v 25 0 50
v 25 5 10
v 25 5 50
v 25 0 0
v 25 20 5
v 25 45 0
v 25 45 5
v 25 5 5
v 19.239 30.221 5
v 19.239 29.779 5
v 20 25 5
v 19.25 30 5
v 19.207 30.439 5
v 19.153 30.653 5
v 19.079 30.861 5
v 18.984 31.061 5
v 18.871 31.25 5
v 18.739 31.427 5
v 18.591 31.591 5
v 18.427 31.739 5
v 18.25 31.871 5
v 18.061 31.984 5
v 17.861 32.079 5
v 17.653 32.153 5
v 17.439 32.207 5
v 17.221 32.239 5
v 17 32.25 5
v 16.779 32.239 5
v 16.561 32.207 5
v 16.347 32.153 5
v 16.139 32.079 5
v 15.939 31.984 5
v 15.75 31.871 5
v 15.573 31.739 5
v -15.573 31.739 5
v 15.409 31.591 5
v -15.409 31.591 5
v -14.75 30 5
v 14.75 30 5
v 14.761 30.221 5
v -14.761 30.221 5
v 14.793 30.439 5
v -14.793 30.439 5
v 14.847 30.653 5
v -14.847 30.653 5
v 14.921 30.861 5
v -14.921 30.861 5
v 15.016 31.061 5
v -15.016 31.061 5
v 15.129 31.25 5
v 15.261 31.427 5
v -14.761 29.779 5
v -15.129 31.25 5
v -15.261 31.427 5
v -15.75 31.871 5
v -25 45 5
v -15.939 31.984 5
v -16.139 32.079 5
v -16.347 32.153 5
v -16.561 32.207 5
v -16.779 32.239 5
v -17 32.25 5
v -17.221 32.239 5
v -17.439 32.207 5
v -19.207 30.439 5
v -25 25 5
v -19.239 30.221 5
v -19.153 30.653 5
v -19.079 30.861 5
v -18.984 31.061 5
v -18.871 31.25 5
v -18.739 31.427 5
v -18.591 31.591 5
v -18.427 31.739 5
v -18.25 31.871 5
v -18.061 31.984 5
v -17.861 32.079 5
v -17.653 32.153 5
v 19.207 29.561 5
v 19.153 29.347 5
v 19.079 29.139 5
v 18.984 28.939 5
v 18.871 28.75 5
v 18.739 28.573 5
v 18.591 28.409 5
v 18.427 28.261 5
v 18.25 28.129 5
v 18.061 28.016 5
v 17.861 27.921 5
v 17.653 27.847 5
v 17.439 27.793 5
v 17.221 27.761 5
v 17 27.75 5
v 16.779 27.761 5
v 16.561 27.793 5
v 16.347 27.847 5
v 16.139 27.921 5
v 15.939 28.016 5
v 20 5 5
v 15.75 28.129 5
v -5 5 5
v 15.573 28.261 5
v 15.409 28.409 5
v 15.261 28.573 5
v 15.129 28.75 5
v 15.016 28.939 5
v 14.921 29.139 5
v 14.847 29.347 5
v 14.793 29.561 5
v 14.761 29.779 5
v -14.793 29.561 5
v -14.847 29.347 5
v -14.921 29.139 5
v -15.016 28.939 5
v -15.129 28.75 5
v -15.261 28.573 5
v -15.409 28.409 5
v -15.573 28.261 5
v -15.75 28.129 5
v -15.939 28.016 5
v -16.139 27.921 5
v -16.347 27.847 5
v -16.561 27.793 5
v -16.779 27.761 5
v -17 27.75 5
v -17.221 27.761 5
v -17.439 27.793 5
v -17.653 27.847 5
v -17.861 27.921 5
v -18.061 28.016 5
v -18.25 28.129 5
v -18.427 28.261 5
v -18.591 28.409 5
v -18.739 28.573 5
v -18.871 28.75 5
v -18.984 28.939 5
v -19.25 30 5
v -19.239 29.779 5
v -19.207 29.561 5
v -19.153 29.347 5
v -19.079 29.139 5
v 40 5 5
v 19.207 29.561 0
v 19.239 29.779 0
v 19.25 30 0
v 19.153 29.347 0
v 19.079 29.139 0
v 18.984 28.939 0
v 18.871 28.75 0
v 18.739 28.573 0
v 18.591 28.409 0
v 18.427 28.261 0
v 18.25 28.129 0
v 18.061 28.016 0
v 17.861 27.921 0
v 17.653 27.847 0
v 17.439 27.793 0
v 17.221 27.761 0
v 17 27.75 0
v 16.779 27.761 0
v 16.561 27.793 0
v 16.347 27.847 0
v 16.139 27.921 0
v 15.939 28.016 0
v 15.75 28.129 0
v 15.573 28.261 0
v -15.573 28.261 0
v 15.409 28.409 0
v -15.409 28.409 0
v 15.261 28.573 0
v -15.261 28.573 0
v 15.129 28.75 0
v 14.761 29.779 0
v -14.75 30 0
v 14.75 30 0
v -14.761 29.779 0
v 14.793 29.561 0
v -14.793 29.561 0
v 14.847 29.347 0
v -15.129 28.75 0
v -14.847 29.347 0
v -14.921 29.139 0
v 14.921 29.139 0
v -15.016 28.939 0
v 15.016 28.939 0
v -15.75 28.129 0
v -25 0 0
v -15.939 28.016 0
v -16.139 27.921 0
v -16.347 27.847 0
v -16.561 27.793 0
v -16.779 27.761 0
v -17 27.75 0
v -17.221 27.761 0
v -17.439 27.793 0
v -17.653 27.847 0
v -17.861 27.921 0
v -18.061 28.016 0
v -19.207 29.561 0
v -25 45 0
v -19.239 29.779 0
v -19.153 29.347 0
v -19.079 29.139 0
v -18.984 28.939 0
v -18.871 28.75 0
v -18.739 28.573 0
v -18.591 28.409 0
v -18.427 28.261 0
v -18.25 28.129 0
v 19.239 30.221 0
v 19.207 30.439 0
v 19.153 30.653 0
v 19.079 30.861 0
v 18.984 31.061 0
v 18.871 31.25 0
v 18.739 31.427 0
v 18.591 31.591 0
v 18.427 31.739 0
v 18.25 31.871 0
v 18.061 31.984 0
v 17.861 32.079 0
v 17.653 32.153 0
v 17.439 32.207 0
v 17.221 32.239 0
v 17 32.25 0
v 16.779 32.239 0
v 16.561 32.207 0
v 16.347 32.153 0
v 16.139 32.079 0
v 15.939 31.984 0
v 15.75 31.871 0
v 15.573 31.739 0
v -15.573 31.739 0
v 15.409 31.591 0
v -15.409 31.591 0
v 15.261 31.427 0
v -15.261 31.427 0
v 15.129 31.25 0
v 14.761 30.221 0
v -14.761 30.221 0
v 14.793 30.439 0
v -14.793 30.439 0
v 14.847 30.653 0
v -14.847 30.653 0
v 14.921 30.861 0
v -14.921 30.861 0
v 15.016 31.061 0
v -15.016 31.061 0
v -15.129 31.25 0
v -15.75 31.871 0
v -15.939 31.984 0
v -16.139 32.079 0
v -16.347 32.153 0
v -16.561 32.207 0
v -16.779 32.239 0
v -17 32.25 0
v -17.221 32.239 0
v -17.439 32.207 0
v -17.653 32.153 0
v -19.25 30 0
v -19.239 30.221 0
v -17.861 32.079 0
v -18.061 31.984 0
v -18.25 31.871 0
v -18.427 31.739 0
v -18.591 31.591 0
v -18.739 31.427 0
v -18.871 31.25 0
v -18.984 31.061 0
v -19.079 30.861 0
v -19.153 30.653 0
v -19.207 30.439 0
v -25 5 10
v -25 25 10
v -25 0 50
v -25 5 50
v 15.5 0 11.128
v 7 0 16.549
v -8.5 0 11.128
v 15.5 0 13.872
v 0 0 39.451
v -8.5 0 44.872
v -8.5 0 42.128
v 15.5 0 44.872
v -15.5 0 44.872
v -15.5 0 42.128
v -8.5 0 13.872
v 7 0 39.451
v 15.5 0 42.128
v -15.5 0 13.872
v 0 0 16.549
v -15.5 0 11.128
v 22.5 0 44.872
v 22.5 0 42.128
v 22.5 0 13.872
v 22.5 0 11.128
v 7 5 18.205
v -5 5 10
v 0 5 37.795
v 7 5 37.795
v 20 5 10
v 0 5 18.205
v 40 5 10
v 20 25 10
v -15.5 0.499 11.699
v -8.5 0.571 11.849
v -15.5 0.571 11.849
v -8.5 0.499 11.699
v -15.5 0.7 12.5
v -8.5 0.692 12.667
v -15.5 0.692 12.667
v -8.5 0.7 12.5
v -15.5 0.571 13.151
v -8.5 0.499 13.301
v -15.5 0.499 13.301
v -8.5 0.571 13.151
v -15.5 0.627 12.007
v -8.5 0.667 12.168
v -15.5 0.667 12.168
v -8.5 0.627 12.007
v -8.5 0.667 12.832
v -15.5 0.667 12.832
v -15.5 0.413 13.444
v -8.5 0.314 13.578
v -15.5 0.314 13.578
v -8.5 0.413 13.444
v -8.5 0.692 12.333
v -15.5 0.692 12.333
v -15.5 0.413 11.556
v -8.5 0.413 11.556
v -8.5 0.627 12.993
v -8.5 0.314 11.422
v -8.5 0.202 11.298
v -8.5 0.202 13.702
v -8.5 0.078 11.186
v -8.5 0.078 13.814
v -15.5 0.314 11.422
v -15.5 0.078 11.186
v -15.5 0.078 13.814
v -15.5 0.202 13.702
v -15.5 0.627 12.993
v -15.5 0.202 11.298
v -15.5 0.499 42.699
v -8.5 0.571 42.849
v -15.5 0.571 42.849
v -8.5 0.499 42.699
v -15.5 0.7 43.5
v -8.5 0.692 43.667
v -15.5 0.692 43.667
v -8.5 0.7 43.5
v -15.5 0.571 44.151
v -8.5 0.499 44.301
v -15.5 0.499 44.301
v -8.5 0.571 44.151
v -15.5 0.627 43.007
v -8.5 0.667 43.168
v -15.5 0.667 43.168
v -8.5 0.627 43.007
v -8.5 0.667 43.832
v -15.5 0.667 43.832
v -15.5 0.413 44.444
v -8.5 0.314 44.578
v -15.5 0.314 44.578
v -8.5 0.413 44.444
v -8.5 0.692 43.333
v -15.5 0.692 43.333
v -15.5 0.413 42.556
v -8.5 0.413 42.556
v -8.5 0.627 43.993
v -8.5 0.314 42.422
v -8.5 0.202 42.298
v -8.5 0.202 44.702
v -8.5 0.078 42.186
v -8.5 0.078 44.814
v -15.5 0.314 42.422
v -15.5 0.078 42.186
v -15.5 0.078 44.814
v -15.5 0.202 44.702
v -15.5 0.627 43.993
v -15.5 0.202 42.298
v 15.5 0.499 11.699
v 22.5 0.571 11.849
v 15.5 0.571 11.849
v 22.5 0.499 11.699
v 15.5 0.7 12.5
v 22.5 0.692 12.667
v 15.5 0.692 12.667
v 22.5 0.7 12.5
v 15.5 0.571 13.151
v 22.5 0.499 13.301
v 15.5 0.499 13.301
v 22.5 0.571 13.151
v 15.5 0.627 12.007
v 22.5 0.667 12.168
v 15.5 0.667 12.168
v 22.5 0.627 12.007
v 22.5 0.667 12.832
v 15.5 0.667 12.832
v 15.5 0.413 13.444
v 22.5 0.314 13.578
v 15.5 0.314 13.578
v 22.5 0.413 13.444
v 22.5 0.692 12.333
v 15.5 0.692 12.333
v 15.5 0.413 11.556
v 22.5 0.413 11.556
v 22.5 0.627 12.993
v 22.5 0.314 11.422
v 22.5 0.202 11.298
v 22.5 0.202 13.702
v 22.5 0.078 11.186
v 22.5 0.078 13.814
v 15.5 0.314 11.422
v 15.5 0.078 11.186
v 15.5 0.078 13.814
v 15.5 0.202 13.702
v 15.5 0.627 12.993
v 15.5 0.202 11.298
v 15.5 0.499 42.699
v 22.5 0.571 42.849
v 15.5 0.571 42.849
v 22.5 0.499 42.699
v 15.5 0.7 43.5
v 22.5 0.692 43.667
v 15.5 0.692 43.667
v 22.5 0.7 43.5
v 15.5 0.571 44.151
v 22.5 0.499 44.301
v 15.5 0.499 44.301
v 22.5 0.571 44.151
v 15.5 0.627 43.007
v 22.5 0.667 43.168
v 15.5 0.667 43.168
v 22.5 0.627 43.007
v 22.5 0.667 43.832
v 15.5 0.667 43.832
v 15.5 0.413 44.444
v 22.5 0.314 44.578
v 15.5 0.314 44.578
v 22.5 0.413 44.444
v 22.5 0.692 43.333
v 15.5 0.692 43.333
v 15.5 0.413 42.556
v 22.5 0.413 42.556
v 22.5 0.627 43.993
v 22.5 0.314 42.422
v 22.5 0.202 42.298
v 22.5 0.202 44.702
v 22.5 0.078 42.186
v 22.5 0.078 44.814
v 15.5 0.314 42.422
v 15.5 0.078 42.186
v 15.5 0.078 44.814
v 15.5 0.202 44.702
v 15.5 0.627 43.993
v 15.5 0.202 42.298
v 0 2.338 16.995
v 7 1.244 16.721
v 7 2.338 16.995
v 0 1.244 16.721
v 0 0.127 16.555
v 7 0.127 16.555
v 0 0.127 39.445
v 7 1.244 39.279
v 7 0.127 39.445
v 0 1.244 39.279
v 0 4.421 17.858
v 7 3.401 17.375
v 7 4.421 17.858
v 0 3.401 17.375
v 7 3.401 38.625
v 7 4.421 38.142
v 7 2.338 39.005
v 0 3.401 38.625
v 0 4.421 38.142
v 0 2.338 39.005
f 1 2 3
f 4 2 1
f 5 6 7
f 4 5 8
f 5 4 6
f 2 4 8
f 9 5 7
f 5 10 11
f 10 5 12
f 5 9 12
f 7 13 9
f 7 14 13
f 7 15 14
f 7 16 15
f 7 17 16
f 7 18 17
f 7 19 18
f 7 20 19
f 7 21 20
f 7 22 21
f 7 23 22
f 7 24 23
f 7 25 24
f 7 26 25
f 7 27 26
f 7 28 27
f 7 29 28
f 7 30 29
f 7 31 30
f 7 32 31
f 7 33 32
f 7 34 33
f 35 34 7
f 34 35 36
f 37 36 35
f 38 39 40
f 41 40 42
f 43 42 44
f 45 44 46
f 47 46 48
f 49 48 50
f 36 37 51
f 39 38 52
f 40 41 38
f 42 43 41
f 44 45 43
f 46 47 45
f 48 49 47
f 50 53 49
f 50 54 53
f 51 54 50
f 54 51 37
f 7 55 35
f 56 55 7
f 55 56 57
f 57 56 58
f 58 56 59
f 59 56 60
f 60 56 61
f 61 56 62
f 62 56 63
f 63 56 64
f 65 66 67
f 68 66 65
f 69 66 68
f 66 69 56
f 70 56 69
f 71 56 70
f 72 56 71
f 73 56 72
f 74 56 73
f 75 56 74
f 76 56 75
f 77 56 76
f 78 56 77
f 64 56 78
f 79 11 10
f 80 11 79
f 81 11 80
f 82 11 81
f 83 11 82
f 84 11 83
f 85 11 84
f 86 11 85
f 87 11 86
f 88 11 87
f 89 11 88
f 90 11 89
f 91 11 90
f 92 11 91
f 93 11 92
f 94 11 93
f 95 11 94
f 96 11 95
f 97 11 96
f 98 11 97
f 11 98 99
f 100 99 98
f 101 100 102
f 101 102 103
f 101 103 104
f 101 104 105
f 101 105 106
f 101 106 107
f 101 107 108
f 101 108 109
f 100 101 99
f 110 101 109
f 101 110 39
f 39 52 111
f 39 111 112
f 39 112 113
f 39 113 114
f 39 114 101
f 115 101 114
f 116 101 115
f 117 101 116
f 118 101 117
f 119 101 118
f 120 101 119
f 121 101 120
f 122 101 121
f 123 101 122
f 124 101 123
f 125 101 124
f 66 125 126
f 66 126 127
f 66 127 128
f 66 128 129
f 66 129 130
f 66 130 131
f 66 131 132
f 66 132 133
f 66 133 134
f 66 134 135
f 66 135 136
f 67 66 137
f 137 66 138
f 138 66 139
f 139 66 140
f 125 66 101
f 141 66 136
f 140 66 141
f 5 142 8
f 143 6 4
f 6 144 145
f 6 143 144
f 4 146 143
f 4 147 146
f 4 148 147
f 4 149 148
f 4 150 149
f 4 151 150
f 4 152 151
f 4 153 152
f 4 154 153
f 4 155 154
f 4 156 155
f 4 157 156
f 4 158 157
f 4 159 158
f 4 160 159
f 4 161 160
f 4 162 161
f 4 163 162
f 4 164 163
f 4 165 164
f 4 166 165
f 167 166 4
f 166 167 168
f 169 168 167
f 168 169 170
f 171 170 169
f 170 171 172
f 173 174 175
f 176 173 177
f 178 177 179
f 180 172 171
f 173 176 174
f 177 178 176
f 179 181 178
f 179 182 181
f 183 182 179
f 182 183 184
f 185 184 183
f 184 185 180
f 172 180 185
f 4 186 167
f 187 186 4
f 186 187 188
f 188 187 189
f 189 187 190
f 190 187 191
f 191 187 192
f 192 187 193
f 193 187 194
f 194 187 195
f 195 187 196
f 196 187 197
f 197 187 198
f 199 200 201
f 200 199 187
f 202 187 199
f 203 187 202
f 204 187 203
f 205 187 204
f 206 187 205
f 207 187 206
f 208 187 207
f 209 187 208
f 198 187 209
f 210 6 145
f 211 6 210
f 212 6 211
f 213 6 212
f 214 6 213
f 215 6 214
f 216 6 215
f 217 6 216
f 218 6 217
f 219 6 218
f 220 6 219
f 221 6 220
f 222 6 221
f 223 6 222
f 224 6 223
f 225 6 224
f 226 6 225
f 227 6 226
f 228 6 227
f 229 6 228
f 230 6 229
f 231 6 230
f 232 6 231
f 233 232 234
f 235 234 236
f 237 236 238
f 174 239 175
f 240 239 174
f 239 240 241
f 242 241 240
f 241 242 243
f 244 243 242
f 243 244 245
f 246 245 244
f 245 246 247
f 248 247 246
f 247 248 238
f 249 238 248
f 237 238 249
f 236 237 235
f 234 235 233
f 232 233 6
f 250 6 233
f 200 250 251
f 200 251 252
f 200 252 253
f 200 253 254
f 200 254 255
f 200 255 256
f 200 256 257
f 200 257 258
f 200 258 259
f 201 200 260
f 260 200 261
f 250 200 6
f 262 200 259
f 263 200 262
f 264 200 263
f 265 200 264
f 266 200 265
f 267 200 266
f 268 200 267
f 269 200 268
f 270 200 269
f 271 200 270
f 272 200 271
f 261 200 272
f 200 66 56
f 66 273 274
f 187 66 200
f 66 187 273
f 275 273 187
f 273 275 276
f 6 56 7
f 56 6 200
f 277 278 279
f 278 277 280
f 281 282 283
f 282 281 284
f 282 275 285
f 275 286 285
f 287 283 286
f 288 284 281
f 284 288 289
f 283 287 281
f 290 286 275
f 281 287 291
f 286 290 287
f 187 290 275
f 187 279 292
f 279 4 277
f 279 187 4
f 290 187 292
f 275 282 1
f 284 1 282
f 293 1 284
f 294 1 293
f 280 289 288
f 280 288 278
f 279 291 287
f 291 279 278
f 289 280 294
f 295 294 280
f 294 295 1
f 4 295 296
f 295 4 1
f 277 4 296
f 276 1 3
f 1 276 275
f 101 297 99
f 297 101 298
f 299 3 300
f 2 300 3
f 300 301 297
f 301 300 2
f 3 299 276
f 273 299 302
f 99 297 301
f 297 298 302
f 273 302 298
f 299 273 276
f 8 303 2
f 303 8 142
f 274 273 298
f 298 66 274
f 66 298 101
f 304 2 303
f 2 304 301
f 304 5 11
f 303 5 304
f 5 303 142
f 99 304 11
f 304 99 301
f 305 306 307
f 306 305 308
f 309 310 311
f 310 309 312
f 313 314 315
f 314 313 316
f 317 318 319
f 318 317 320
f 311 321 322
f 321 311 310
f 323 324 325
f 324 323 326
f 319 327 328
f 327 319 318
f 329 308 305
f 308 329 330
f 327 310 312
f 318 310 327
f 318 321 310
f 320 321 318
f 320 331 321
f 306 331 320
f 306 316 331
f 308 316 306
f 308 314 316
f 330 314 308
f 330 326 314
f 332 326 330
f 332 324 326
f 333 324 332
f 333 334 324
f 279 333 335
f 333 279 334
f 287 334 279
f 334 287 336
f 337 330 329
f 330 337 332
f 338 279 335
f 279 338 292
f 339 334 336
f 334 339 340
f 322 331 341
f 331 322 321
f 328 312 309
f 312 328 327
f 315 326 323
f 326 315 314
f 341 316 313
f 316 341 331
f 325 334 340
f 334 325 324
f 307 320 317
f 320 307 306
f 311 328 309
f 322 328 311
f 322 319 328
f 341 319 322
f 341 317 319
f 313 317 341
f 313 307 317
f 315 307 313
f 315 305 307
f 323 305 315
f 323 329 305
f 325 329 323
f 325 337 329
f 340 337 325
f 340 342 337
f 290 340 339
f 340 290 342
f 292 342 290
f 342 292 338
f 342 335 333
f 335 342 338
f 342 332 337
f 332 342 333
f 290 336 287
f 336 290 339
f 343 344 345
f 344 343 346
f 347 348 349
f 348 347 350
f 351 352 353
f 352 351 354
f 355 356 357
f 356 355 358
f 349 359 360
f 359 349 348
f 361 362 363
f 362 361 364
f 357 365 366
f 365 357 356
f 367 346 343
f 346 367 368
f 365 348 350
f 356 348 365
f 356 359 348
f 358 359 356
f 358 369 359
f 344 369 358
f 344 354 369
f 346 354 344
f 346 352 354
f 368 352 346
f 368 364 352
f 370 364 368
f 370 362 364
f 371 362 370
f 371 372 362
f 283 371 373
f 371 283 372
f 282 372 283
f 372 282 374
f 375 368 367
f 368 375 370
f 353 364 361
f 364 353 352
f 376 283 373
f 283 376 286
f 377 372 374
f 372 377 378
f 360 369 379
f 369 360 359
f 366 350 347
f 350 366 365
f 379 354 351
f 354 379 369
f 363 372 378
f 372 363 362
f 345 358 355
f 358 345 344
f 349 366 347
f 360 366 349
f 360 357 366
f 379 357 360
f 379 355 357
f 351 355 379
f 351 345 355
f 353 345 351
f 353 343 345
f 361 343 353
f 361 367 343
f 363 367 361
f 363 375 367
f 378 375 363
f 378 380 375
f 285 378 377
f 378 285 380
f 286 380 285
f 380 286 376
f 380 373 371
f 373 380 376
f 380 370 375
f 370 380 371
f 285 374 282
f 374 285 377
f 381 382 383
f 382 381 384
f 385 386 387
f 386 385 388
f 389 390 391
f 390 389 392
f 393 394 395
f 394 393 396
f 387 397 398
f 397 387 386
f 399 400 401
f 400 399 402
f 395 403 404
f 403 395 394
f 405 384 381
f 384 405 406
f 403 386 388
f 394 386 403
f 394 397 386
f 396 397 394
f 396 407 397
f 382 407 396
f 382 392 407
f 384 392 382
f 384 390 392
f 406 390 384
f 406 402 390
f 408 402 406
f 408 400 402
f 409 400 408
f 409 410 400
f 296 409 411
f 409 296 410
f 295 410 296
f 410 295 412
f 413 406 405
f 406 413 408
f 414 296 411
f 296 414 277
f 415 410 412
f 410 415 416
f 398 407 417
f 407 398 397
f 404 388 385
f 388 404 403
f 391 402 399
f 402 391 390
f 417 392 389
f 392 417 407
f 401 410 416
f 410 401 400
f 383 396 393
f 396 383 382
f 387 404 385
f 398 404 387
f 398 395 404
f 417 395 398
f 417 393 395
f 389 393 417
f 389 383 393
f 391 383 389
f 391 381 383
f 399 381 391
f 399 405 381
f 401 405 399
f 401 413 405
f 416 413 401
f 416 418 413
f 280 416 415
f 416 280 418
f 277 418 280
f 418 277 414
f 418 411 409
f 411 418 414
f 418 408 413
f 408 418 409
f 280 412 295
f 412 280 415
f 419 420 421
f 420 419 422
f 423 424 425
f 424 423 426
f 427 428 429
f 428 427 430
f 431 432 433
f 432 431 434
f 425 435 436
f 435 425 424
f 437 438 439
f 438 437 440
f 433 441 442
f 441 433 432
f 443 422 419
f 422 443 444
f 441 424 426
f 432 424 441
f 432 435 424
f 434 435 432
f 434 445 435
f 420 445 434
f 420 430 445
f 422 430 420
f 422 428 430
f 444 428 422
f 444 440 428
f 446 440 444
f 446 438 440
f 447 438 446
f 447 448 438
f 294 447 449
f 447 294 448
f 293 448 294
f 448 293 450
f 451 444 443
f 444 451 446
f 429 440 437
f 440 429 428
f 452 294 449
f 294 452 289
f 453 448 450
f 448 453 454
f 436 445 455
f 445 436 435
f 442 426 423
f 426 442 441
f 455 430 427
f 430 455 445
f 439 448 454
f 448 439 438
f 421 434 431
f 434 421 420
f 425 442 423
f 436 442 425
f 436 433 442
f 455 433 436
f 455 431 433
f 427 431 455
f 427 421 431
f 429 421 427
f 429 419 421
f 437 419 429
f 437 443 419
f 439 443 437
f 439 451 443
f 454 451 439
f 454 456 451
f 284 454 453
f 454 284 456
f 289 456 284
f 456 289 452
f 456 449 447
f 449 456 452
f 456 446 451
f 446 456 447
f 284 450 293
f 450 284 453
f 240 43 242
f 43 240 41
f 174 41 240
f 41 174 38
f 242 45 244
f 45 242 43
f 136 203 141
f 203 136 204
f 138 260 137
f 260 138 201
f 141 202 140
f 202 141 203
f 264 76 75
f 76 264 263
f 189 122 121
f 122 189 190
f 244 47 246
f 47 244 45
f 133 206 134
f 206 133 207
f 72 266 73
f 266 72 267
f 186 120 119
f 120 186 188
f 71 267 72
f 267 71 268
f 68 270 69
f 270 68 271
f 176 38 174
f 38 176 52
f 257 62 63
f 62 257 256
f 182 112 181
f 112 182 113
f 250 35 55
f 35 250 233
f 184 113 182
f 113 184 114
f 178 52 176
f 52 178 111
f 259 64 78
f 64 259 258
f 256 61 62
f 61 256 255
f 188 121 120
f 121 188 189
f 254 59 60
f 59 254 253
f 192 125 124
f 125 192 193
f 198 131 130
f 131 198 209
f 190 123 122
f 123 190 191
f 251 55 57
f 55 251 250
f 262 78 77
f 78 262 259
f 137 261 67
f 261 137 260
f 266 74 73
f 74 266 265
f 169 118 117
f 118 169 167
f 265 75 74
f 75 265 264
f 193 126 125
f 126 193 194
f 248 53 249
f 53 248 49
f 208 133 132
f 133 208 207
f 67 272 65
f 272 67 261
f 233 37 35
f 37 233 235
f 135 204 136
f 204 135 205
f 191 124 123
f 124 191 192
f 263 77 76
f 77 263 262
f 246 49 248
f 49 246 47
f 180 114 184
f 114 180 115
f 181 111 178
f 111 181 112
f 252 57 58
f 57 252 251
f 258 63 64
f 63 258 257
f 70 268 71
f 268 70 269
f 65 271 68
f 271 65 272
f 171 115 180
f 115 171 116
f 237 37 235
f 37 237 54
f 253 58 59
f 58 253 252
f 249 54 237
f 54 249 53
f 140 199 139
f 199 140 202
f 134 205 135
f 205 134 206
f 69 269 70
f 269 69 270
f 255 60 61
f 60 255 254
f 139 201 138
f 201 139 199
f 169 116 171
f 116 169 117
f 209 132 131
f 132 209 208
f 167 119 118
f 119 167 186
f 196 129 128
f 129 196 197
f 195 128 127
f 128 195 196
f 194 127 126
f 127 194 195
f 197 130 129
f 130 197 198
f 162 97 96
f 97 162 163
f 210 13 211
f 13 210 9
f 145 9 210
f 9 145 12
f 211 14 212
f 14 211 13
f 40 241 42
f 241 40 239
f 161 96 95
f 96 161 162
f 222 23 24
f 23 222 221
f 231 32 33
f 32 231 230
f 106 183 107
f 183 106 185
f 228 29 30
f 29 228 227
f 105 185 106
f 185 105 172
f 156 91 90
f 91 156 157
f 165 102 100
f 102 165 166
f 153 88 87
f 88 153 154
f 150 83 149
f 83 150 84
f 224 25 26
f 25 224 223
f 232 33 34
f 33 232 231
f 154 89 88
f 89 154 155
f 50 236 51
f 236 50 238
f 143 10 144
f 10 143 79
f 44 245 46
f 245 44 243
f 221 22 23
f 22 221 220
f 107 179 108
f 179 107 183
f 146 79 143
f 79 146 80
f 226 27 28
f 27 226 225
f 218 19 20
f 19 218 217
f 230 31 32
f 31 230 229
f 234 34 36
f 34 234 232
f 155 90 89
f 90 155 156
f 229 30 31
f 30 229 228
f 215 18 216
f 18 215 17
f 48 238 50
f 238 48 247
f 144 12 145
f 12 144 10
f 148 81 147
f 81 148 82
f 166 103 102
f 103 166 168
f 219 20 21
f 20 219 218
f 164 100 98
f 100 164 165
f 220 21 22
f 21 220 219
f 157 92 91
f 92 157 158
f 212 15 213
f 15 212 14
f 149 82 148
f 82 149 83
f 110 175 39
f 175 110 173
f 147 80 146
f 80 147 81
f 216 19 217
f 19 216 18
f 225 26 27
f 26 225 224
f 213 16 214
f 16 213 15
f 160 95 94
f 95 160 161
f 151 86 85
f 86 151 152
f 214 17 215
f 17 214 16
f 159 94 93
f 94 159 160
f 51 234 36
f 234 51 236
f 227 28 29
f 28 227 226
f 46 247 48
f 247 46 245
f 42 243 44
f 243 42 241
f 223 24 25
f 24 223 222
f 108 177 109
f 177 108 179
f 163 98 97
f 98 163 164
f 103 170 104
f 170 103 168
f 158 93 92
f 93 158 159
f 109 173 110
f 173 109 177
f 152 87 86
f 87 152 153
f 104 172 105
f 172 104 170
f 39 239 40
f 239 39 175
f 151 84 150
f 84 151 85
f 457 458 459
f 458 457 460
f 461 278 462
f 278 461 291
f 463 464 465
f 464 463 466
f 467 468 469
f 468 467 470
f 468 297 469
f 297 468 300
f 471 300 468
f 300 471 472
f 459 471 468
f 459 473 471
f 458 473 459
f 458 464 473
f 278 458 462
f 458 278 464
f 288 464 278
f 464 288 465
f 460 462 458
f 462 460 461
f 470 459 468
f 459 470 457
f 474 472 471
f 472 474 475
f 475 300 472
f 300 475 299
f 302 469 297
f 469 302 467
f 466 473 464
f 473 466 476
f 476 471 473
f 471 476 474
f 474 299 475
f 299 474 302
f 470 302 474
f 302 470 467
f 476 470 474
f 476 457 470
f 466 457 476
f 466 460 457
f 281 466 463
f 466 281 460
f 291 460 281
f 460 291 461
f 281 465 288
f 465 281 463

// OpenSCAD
// L-shaped NEMA 17 Stepper Motor Mounting Bracket
// Corrected version: Gussets properly aligned to edges and YZ plane.

// --- Dimensions ---
// Base Plate
base_x_min = -25;
base_x_max = 25;
base_y_min = 0;
base_y_max = 45;
base_z_max = 5;

// M4 Holes (Base)
m4_hole_d = 4.5;
m4_x1 = -17;
m4_y1 = 30;
m4_x2 = 17;
m4_y2 = 30;

// Vertical Motor Plate
vert_x_min = -25;
vert_x_max = 25;
vert_y_min = 0;
vert_y_max = 5;
vert_z_max = 50;

// Motor Boss Hole (Vertical Plate)
boss_d = 23;
boss_x = 0;
boss_z = 28;

// M3 Holes (Motor Plate)
m3_hole_d = 3.4;
m3_pattern_size = 31;

// Gussets
gusset_thick = 5;
gusset_leg_y = 20;
gusset_leg_z = 20;
gusset_y_start = 5; // Corner at y=5
gusset_z_start = 5; // Corner at z=5

$fn = 64;

// --- Modeling ---

module gusset_shape() {
    // Right triangle in YZ plane
    // Corner at (0,0) in local YZ coords
    polygon(points = [
        [0, 0],
        [gusset_leg_y, 0],
        [0, gusset_leg_z]
    ]);
}

difference() {
    union() {
        // Base Plate
        translate([base_x_min, base_y_min, 0])
            cube([base_x_max - base_x_min, base_y_max - base_y_min, base_z_max]);
        
        // Vertical Motor Plate
        translate([vert_x_min, vert_y_min, 0])
            cube([vert_x_max - vert_x_min, vert_y_max, vert_z_max]);
            
        // Gusset Left (Flush with x = -25, thickness 5mm)
        // Positioned from x = -25 to -20
        translate([base_x_min, gusset_y_start, gusset_z_start])
            linear_extrude(height = gusset_thick)
            gusset_shape();
            
        // Gusset Right (Flush with x = 25, thickness 5mm)
        // Positioned from x = 20 to 25
        translate([base_x_max - gusset_thick, gusset_y_start, gusset_z_start])
            linear_extrude(height = gusset_thick)
            gusset_shape();
    }

    // --- Subtractions ---

    // M4 Holes in Base Plate
    translate([m4_x1, m4_y1, -1]) 
        cylinder(h = base_z_max + 2, d = m4_hole_d);
    translate([m4_x2, m4_y2, -1]) 
        cylinder(h = base_z_max + 2, d = m4_hole_d);

    // Motor Boss Hole (Through the vertical plate along Y)
    translate([boss_x, -1, boss_z])
        rotate([0, 90, 0])
        cylinder(h = vert_y_max + 2, d = boss_d);

    // M3 Screw Holes (4 holes on 31mm square pattern)
    // Pattern is centered on the boss hole (x=0, z=28)
    for (sx = [-1, 1], sy = [-1, 1]) {
        translate([sx * (m3_pattern_size / 2), -1, boss_z + sy * (m3_pattern_size / 2)])
            rotate([0, 90, 0])
            cylinder(h = vert_y_max + 2, d = m3_hole_d);
    }
}
